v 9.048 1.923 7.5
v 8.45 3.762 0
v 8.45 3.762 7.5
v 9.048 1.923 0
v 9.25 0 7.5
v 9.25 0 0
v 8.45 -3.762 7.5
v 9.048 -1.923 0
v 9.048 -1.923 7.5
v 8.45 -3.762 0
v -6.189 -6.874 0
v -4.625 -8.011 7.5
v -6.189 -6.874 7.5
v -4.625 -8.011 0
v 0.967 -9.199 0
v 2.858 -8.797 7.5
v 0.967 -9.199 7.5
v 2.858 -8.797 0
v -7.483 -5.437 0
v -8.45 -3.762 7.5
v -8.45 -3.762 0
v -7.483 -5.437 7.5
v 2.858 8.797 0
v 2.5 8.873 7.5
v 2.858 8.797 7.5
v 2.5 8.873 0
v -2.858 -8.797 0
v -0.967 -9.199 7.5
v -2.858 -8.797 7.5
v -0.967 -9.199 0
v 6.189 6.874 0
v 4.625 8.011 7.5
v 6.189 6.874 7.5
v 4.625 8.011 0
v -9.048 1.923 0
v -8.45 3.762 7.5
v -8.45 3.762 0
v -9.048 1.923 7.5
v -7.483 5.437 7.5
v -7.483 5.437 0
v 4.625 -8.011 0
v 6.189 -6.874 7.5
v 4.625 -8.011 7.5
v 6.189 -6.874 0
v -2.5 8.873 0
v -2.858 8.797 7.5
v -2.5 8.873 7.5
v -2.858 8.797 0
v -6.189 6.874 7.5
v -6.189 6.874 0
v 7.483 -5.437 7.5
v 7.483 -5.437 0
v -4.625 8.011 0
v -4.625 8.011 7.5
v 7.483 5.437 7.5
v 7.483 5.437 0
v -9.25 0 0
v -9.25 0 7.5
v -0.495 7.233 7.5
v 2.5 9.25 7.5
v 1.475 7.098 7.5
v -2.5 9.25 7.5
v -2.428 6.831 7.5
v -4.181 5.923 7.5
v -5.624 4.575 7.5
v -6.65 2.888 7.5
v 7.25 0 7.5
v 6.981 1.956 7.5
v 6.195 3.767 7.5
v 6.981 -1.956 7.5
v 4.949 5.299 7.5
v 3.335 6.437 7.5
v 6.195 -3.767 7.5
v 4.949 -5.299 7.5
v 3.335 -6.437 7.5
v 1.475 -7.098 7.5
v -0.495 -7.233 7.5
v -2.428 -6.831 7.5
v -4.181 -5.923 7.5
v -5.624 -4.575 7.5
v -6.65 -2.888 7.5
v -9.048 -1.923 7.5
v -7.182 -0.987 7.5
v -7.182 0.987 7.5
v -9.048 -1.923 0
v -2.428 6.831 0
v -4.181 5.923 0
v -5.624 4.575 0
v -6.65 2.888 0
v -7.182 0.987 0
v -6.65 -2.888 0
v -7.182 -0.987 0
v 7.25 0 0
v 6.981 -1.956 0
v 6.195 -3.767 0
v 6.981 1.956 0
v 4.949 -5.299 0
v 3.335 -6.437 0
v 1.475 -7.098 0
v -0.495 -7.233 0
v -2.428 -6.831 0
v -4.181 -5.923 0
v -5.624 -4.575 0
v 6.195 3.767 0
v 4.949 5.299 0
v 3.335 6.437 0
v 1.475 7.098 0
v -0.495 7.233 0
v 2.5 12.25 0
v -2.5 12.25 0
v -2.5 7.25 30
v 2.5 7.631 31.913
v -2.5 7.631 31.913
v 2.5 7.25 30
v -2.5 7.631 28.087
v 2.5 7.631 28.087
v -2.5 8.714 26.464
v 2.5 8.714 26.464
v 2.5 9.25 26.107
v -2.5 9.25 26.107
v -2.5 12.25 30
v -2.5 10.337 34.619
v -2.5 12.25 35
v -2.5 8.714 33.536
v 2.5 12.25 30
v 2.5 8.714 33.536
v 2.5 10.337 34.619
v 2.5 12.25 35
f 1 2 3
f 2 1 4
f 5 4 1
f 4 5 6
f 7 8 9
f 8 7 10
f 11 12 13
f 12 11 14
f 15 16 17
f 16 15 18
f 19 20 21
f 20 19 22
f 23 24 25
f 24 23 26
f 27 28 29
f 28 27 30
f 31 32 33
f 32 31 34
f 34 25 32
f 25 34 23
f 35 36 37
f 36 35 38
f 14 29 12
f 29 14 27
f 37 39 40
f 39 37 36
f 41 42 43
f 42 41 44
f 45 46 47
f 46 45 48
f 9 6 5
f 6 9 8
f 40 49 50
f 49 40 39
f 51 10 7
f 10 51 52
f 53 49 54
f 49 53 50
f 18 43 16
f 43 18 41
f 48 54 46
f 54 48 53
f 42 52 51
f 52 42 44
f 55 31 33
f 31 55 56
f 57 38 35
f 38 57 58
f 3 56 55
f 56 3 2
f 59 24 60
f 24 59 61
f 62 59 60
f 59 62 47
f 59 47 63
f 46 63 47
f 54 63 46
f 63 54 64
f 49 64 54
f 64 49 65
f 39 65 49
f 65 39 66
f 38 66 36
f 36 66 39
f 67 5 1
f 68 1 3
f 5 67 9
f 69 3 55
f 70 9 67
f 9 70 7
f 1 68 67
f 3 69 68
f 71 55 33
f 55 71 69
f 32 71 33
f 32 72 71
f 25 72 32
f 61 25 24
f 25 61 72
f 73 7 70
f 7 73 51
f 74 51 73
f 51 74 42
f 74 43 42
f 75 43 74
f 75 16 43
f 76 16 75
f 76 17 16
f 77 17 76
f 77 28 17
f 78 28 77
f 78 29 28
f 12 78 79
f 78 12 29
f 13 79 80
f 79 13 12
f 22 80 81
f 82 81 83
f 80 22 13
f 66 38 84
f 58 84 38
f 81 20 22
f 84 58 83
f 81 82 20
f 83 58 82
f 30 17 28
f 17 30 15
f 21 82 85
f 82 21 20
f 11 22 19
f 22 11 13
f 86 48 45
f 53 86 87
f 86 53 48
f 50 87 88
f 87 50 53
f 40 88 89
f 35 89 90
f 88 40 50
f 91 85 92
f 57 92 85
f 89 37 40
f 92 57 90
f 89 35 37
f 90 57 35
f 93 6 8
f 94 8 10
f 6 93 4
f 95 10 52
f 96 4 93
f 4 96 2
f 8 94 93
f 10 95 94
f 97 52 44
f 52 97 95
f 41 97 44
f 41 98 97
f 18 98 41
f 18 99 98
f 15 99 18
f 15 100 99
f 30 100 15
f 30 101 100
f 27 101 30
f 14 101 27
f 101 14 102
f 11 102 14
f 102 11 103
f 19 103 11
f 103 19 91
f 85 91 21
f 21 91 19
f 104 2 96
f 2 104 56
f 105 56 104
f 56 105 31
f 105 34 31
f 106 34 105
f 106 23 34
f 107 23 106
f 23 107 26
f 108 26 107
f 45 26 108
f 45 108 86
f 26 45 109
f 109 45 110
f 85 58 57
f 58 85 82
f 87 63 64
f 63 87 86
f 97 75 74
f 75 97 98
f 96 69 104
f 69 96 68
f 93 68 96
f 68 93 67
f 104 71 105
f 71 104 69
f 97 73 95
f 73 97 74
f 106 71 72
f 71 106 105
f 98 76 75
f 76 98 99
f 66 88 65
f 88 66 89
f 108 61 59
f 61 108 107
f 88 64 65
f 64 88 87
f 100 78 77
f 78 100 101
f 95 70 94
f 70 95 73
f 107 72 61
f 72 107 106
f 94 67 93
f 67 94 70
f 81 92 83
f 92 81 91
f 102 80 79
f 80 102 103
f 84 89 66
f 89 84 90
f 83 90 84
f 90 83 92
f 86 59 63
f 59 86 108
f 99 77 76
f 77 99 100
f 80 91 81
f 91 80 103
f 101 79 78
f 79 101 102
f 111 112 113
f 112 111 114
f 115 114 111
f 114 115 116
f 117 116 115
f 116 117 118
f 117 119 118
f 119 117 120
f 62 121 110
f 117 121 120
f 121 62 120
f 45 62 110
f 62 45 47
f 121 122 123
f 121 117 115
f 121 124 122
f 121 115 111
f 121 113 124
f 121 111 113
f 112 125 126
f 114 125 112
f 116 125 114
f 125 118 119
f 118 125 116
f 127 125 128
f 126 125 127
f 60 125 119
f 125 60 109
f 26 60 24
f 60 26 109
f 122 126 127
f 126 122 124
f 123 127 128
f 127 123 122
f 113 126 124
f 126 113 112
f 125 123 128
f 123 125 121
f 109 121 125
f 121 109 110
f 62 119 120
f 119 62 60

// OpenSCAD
// [FL_INDEX: keywords="openscad, 3d_parametric, Parametric_Pen_Clip, csg_solid" | COT="Parametric OpenSCAD design from 3DCodeverse"]
// Title: Parametric Pen Clip

// Pen-style Clip for Cylindrical Things
// (c) 2013, Christopher "ScribbleJ" Jansen

// Diameter of Pen
pen_d = 14.5;
// Thickness of Pen-Holding Part
pen_thick = 2;
// Length of Pen-holding Part
pen_l = 7.5;
// Clip Length
clip_l = 30;
// Clip Thickness
clip_thick = 3;
// Clip Width
clip_w     = 5;
// Clip Bump Thickness
clip_bump  = 5;

/* [Hidden] */

huge = 500;

union()
{
difference()
{
  cylinder(r=pen_d/2 + pen_thick, h=pen_l);
  translate([0,0,-0.5]) cylinder(r=pen_d/2, h=pen_l+1);
}
translate([-clip_w/2,0,0])
{
  translate([0,pen_d/2 + (clip_bump-clip_thick),0]) cube([clip_w,clip_thick,clip_l]);
  translate([0,pen_d/2,0]) cube([clip_w, clip_bump, pen_l]);
  //#translate([0,pen_d/2 + clip_thick,clip_l]) 
  translate([0,pen_d/2 + clip_bump,clip_l]) difference() 
  {
    rotate([0,90,0]) cylinder(r=clip_bump, h=clip_w);
    translate([-huge/2,0,-huge/2]) cube([huge,huge,huge]);
  }
}
}
